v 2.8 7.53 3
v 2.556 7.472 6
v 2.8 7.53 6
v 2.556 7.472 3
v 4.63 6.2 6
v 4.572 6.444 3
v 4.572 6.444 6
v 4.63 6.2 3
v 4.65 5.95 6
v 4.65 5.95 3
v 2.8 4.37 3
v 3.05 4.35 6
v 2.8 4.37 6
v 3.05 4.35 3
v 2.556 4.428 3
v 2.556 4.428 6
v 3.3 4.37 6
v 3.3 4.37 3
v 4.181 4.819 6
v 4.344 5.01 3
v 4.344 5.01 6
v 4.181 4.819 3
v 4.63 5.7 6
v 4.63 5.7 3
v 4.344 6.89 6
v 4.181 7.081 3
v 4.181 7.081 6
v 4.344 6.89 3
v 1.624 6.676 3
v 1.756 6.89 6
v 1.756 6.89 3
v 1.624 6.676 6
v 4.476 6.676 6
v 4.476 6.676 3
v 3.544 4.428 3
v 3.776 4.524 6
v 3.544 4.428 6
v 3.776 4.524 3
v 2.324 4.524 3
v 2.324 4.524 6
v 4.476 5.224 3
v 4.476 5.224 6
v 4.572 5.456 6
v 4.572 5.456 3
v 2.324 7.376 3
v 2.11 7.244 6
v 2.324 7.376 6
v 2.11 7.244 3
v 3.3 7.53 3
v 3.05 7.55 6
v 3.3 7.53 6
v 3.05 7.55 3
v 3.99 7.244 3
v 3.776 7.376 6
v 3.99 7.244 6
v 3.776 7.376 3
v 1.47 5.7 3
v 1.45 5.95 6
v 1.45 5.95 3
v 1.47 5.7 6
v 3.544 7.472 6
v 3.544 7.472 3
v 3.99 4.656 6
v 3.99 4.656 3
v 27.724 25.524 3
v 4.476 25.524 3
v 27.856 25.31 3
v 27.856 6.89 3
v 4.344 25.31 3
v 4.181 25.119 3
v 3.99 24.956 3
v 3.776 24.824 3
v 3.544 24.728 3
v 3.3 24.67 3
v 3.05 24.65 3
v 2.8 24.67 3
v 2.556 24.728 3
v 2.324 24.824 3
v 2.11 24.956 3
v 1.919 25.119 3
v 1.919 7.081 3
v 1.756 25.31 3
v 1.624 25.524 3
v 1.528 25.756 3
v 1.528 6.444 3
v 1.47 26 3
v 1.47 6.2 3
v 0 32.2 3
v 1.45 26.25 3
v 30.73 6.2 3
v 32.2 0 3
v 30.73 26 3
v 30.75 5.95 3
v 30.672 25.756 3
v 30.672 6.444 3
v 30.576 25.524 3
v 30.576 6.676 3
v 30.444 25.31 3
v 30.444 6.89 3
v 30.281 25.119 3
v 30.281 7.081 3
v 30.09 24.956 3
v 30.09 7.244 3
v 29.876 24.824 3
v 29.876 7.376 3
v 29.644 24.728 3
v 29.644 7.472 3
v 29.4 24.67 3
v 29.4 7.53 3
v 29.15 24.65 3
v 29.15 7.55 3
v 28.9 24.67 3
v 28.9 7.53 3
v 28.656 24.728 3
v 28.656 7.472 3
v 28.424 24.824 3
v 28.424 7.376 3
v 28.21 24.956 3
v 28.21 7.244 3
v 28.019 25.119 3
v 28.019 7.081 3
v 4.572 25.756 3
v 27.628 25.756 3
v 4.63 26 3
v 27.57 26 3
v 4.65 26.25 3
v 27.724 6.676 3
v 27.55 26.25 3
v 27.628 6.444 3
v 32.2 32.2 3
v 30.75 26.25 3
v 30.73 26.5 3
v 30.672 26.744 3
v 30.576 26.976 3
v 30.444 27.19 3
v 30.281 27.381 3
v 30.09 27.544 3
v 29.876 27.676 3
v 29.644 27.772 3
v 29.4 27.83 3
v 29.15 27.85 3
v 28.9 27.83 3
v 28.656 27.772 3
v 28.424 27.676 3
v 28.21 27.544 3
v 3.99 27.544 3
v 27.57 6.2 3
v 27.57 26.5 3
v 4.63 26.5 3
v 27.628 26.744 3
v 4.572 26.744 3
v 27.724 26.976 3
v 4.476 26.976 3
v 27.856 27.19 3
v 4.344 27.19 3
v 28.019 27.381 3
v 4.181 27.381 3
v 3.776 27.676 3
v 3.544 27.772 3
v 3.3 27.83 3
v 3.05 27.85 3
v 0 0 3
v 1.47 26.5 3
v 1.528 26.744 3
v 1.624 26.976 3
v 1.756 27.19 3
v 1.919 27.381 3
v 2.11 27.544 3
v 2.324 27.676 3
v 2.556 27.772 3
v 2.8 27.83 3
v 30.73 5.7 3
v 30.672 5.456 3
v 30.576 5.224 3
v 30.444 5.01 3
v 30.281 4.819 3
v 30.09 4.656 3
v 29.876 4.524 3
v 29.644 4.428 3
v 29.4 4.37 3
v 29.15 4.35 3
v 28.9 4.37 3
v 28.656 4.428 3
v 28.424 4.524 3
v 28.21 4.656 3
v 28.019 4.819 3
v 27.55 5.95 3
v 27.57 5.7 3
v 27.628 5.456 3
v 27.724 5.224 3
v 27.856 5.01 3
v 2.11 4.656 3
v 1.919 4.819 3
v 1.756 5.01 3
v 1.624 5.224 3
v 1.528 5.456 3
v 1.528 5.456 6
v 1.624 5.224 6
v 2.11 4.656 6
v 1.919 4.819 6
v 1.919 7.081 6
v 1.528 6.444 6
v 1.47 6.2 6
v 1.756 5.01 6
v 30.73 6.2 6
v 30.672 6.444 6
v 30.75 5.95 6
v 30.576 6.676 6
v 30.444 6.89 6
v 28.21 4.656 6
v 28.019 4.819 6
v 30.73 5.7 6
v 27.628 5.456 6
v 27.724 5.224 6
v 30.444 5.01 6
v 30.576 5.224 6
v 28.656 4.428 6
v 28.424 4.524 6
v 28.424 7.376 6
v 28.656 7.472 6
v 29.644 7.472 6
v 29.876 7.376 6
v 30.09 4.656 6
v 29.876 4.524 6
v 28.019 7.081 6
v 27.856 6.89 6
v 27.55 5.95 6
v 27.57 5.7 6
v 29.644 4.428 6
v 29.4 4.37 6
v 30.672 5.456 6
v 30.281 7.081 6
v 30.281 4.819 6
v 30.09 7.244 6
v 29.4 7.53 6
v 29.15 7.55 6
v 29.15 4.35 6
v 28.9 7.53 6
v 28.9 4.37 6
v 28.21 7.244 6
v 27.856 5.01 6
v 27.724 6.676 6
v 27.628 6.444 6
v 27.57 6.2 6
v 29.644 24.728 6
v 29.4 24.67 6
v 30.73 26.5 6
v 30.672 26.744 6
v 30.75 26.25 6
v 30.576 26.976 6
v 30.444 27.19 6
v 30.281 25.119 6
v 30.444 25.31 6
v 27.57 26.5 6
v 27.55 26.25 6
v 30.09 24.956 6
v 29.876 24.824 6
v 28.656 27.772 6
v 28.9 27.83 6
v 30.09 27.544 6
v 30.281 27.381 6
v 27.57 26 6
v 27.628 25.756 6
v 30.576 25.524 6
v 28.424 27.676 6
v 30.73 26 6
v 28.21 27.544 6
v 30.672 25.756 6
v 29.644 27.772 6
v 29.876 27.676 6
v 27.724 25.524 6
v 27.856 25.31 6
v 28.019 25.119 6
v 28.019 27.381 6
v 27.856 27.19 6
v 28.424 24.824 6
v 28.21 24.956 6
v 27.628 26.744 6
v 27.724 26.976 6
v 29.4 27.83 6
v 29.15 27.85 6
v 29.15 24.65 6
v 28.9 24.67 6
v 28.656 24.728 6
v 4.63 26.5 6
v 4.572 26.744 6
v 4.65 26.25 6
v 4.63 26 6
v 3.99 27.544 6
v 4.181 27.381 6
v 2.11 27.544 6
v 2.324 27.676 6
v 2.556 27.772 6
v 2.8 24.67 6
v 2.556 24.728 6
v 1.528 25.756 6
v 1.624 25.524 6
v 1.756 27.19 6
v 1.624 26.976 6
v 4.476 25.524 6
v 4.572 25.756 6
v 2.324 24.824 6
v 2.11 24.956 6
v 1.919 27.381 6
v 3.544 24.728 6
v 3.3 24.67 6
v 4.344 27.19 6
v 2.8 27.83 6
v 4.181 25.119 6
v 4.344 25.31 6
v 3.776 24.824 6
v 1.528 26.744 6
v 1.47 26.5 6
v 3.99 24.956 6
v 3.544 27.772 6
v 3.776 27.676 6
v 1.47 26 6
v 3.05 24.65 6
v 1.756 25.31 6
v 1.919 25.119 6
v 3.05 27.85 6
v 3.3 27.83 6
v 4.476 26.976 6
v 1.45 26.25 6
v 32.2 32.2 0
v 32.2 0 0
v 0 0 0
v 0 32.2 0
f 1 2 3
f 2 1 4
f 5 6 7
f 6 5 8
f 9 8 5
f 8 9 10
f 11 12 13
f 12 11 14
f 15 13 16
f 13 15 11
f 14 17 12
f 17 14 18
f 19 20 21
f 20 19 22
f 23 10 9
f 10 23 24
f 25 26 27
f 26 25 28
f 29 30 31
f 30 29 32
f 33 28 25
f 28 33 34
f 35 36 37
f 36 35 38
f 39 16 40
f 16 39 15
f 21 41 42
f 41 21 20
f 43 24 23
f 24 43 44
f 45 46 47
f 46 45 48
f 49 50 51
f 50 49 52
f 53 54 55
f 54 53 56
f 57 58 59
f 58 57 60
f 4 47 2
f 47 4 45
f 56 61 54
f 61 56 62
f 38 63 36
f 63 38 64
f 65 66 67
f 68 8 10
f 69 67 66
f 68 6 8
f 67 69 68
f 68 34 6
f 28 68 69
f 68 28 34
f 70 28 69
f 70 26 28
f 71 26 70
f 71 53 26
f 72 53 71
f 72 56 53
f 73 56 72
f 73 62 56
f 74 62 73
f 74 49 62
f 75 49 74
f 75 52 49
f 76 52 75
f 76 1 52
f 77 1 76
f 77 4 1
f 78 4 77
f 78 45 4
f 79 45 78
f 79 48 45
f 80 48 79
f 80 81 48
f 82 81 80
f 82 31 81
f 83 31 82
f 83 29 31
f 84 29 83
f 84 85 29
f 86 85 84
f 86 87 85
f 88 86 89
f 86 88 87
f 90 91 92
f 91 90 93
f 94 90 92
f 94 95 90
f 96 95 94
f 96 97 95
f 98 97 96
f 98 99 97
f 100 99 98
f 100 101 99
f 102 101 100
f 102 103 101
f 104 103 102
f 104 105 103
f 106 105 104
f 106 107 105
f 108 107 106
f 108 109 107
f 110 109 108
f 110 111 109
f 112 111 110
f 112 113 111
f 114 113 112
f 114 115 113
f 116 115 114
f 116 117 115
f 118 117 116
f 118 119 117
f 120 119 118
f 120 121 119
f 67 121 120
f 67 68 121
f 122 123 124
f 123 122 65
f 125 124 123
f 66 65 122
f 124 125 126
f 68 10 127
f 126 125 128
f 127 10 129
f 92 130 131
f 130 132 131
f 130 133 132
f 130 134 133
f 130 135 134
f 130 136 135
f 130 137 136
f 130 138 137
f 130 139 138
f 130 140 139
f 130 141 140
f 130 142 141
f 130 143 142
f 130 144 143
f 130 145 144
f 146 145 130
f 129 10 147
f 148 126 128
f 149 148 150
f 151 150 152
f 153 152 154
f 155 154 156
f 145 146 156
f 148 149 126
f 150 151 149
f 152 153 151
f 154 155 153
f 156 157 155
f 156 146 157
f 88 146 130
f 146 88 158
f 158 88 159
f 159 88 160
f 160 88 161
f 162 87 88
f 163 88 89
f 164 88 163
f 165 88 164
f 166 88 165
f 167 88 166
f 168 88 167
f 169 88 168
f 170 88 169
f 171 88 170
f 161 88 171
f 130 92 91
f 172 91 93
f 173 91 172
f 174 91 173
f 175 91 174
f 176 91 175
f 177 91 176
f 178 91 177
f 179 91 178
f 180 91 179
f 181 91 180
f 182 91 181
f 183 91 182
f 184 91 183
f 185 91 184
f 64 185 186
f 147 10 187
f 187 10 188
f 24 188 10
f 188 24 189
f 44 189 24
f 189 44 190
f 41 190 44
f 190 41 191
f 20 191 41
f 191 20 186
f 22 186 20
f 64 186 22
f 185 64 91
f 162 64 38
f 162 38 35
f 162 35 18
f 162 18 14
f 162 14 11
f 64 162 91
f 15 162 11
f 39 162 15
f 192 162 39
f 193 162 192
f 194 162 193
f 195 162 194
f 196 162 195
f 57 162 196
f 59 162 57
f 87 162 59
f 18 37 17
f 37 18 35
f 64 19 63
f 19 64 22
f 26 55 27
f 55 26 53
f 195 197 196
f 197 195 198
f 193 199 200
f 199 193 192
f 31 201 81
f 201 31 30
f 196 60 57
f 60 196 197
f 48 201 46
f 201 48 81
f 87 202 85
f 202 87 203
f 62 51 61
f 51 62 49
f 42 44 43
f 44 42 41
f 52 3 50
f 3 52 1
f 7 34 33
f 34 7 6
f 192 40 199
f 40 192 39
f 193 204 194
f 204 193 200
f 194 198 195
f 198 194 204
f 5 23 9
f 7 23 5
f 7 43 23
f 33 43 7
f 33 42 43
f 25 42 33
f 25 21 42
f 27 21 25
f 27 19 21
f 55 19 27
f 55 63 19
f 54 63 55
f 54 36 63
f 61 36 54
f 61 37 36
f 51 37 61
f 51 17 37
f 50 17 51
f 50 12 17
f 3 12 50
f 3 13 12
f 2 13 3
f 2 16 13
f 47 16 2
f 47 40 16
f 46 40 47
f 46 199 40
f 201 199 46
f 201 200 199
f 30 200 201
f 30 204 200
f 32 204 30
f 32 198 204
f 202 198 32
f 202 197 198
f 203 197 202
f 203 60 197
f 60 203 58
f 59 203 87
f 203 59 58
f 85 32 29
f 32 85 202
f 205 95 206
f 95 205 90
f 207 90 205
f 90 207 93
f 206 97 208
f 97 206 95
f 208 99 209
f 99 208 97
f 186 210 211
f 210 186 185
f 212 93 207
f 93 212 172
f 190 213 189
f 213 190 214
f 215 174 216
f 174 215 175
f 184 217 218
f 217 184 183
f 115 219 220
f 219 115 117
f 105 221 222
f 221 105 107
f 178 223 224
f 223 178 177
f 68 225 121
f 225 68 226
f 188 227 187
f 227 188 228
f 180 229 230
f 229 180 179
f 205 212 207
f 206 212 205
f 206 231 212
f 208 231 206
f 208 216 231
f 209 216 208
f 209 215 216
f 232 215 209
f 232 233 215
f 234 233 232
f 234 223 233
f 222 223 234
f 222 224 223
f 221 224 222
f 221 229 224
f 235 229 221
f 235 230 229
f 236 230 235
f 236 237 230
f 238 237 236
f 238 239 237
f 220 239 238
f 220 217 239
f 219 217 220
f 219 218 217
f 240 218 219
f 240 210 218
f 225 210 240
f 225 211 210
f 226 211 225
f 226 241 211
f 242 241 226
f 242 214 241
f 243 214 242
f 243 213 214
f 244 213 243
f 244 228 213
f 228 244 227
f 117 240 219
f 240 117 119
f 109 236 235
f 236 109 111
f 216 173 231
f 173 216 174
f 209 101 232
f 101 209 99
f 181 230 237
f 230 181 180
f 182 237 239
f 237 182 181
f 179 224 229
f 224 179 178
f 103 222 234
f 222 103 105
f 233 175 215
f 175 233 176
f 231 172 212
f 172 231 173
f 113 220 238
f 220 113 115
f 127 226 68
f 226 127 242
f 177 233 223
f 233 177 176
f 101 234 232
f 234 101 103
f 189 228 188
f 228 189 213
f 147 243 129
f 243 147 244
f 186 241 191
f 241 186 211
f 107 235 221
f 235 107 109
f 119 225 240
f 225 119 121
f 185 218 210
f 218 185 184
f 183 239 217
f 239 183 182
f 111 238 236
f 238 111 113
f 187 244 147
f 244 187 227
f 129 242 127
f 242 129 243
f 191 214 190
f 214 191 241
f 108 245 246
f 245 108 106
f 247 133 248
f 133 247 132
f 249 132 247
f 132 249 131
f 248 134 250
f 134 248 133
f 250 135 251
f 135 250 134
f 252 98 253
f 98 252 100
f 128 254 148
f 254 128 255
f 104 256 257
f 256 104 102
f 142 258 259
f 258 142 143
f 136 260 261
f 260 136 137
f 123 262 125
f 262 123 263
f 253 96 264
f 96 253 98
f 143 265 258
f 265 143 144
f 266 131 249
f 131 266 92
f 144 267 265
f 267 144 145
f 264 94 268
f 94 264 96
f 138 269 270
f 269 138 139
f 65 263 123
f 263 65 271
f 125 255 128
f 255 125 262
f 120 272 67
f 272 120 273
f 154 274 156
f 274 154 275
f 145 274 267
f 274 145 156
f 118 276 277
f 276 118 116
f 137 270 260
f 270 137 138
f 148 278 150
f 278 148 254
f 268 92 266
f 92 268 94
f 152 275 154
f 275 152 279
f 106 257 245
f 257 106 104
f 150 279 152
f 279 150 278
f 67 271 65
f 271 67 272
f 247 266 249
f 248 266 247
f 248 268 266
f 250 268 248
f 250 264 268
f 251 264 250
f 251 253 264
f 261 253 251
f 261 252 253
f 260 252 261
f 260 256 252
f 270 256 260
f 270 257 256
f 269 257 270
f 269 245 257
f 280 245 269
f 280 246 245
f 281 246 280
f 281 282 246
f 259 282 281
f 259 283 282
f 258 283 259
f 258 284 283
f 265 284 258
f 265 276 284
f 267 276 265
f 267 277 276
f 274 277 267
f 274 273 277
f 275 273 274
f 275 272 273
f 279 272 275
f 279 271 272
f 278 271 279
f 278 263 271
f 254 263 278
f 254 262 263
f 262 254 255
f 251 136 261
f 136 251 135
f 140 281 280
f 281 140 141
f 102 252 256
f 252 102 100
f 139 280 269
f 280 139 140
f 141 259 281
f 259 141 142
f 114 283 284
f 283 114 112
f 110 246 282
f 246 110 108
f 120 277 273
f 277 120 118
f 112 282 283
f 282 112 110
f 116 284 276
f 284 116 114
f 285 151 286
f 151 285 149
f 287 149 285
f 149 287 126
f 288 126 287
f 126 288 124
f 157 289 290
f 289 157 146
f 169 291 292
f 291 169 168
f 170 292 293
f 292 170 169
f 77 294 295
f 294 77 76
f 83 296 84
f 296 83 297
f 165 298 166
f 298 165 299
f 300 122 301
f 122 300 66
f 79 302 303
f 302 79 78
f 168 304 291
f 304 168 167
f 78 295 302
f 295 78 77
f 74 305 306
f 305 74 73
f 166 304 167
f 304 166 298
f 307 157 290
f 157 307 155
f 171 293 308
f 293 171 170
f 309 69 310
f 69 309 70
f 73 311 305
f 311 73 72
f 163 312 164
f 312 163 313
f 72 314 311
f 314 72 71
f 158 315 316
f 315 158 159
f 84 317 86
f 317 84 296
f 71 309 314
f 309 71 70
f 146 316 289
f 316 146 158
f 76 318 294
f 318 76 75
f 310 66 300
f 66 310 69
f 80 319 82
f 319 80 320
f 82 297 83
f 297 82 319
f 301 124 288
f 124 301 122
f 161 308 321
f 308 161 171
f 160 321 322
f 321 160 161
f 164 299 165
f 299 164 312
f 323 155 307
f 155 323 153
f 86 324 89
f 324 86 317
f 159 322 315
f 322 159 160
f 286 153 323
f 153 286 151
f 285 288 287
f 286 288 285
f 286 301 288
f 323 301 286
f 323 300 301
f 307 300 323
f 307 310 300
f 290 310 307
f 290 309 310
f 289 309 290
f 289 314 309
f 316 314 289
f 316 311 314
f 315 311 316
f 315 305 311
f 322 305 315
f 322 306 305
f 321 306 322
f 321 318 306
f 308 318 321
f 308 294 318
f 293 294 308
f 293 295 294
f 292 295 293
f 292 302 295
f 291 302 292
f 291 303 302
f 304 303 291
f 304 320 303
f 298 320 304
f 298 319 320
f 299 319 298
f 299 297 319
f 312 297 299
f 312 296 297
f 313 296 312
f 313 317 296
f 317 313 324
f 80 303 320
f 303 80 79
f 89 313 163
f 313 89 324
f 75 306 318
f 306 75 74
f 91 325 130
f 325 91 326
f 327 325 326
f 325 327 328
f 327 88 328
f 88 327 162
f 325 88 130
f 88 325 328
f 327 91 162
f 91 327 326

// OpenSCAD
// === Параметры ===
plate_length = 32.2;       // Длина платы (мм)
plate_width = 32.2;        // Ширина платы (мм)
hole_diameter = 3.5;       // Диаметр монтажного отверстия (мм)
peg_height = 3;          // Высота штырьков (мм)
peg_diameter = 3.2;      // Диаметр штырька (мм) — немного меньше отверстия
base_thickness = 3;      // Толщина подложки (мм)
peg_offset = 1.3 + hole_diameter  / 2.;          // Отступ отверстий от края платы (мм)
peg_offset_2 = 4.2 + hole_diameter  / 2.;          // Отступ отверстий от края платы (мм)

// === Основной вызов ===
generate_mount();

// === Модули ===

module generate_mount() {
    difference() {
        // Подложка
        cube([plate_length, plate_width, base_thickness]);
    }

    // Штырьки
    for (pos = hole_positions()) {
        translate([pos[0], pos[1], base_thickness])
            peg();
    }
}

// Позиции отверстий (в углах)
function hole_positions() = [
    [peg_offset, peg_offset_2],
    [plate_length - peg_offset, peg_offset_2],
    [plate_length - peg_offset, plate_width - peg_offset_2],
    [peg_offset, plate_width - peg_offset_2]
];

// Штырёк (цилиндр)
module peg() {
    cylinder(h = peg_height, d = peg_diameter, $fn=40);
}
